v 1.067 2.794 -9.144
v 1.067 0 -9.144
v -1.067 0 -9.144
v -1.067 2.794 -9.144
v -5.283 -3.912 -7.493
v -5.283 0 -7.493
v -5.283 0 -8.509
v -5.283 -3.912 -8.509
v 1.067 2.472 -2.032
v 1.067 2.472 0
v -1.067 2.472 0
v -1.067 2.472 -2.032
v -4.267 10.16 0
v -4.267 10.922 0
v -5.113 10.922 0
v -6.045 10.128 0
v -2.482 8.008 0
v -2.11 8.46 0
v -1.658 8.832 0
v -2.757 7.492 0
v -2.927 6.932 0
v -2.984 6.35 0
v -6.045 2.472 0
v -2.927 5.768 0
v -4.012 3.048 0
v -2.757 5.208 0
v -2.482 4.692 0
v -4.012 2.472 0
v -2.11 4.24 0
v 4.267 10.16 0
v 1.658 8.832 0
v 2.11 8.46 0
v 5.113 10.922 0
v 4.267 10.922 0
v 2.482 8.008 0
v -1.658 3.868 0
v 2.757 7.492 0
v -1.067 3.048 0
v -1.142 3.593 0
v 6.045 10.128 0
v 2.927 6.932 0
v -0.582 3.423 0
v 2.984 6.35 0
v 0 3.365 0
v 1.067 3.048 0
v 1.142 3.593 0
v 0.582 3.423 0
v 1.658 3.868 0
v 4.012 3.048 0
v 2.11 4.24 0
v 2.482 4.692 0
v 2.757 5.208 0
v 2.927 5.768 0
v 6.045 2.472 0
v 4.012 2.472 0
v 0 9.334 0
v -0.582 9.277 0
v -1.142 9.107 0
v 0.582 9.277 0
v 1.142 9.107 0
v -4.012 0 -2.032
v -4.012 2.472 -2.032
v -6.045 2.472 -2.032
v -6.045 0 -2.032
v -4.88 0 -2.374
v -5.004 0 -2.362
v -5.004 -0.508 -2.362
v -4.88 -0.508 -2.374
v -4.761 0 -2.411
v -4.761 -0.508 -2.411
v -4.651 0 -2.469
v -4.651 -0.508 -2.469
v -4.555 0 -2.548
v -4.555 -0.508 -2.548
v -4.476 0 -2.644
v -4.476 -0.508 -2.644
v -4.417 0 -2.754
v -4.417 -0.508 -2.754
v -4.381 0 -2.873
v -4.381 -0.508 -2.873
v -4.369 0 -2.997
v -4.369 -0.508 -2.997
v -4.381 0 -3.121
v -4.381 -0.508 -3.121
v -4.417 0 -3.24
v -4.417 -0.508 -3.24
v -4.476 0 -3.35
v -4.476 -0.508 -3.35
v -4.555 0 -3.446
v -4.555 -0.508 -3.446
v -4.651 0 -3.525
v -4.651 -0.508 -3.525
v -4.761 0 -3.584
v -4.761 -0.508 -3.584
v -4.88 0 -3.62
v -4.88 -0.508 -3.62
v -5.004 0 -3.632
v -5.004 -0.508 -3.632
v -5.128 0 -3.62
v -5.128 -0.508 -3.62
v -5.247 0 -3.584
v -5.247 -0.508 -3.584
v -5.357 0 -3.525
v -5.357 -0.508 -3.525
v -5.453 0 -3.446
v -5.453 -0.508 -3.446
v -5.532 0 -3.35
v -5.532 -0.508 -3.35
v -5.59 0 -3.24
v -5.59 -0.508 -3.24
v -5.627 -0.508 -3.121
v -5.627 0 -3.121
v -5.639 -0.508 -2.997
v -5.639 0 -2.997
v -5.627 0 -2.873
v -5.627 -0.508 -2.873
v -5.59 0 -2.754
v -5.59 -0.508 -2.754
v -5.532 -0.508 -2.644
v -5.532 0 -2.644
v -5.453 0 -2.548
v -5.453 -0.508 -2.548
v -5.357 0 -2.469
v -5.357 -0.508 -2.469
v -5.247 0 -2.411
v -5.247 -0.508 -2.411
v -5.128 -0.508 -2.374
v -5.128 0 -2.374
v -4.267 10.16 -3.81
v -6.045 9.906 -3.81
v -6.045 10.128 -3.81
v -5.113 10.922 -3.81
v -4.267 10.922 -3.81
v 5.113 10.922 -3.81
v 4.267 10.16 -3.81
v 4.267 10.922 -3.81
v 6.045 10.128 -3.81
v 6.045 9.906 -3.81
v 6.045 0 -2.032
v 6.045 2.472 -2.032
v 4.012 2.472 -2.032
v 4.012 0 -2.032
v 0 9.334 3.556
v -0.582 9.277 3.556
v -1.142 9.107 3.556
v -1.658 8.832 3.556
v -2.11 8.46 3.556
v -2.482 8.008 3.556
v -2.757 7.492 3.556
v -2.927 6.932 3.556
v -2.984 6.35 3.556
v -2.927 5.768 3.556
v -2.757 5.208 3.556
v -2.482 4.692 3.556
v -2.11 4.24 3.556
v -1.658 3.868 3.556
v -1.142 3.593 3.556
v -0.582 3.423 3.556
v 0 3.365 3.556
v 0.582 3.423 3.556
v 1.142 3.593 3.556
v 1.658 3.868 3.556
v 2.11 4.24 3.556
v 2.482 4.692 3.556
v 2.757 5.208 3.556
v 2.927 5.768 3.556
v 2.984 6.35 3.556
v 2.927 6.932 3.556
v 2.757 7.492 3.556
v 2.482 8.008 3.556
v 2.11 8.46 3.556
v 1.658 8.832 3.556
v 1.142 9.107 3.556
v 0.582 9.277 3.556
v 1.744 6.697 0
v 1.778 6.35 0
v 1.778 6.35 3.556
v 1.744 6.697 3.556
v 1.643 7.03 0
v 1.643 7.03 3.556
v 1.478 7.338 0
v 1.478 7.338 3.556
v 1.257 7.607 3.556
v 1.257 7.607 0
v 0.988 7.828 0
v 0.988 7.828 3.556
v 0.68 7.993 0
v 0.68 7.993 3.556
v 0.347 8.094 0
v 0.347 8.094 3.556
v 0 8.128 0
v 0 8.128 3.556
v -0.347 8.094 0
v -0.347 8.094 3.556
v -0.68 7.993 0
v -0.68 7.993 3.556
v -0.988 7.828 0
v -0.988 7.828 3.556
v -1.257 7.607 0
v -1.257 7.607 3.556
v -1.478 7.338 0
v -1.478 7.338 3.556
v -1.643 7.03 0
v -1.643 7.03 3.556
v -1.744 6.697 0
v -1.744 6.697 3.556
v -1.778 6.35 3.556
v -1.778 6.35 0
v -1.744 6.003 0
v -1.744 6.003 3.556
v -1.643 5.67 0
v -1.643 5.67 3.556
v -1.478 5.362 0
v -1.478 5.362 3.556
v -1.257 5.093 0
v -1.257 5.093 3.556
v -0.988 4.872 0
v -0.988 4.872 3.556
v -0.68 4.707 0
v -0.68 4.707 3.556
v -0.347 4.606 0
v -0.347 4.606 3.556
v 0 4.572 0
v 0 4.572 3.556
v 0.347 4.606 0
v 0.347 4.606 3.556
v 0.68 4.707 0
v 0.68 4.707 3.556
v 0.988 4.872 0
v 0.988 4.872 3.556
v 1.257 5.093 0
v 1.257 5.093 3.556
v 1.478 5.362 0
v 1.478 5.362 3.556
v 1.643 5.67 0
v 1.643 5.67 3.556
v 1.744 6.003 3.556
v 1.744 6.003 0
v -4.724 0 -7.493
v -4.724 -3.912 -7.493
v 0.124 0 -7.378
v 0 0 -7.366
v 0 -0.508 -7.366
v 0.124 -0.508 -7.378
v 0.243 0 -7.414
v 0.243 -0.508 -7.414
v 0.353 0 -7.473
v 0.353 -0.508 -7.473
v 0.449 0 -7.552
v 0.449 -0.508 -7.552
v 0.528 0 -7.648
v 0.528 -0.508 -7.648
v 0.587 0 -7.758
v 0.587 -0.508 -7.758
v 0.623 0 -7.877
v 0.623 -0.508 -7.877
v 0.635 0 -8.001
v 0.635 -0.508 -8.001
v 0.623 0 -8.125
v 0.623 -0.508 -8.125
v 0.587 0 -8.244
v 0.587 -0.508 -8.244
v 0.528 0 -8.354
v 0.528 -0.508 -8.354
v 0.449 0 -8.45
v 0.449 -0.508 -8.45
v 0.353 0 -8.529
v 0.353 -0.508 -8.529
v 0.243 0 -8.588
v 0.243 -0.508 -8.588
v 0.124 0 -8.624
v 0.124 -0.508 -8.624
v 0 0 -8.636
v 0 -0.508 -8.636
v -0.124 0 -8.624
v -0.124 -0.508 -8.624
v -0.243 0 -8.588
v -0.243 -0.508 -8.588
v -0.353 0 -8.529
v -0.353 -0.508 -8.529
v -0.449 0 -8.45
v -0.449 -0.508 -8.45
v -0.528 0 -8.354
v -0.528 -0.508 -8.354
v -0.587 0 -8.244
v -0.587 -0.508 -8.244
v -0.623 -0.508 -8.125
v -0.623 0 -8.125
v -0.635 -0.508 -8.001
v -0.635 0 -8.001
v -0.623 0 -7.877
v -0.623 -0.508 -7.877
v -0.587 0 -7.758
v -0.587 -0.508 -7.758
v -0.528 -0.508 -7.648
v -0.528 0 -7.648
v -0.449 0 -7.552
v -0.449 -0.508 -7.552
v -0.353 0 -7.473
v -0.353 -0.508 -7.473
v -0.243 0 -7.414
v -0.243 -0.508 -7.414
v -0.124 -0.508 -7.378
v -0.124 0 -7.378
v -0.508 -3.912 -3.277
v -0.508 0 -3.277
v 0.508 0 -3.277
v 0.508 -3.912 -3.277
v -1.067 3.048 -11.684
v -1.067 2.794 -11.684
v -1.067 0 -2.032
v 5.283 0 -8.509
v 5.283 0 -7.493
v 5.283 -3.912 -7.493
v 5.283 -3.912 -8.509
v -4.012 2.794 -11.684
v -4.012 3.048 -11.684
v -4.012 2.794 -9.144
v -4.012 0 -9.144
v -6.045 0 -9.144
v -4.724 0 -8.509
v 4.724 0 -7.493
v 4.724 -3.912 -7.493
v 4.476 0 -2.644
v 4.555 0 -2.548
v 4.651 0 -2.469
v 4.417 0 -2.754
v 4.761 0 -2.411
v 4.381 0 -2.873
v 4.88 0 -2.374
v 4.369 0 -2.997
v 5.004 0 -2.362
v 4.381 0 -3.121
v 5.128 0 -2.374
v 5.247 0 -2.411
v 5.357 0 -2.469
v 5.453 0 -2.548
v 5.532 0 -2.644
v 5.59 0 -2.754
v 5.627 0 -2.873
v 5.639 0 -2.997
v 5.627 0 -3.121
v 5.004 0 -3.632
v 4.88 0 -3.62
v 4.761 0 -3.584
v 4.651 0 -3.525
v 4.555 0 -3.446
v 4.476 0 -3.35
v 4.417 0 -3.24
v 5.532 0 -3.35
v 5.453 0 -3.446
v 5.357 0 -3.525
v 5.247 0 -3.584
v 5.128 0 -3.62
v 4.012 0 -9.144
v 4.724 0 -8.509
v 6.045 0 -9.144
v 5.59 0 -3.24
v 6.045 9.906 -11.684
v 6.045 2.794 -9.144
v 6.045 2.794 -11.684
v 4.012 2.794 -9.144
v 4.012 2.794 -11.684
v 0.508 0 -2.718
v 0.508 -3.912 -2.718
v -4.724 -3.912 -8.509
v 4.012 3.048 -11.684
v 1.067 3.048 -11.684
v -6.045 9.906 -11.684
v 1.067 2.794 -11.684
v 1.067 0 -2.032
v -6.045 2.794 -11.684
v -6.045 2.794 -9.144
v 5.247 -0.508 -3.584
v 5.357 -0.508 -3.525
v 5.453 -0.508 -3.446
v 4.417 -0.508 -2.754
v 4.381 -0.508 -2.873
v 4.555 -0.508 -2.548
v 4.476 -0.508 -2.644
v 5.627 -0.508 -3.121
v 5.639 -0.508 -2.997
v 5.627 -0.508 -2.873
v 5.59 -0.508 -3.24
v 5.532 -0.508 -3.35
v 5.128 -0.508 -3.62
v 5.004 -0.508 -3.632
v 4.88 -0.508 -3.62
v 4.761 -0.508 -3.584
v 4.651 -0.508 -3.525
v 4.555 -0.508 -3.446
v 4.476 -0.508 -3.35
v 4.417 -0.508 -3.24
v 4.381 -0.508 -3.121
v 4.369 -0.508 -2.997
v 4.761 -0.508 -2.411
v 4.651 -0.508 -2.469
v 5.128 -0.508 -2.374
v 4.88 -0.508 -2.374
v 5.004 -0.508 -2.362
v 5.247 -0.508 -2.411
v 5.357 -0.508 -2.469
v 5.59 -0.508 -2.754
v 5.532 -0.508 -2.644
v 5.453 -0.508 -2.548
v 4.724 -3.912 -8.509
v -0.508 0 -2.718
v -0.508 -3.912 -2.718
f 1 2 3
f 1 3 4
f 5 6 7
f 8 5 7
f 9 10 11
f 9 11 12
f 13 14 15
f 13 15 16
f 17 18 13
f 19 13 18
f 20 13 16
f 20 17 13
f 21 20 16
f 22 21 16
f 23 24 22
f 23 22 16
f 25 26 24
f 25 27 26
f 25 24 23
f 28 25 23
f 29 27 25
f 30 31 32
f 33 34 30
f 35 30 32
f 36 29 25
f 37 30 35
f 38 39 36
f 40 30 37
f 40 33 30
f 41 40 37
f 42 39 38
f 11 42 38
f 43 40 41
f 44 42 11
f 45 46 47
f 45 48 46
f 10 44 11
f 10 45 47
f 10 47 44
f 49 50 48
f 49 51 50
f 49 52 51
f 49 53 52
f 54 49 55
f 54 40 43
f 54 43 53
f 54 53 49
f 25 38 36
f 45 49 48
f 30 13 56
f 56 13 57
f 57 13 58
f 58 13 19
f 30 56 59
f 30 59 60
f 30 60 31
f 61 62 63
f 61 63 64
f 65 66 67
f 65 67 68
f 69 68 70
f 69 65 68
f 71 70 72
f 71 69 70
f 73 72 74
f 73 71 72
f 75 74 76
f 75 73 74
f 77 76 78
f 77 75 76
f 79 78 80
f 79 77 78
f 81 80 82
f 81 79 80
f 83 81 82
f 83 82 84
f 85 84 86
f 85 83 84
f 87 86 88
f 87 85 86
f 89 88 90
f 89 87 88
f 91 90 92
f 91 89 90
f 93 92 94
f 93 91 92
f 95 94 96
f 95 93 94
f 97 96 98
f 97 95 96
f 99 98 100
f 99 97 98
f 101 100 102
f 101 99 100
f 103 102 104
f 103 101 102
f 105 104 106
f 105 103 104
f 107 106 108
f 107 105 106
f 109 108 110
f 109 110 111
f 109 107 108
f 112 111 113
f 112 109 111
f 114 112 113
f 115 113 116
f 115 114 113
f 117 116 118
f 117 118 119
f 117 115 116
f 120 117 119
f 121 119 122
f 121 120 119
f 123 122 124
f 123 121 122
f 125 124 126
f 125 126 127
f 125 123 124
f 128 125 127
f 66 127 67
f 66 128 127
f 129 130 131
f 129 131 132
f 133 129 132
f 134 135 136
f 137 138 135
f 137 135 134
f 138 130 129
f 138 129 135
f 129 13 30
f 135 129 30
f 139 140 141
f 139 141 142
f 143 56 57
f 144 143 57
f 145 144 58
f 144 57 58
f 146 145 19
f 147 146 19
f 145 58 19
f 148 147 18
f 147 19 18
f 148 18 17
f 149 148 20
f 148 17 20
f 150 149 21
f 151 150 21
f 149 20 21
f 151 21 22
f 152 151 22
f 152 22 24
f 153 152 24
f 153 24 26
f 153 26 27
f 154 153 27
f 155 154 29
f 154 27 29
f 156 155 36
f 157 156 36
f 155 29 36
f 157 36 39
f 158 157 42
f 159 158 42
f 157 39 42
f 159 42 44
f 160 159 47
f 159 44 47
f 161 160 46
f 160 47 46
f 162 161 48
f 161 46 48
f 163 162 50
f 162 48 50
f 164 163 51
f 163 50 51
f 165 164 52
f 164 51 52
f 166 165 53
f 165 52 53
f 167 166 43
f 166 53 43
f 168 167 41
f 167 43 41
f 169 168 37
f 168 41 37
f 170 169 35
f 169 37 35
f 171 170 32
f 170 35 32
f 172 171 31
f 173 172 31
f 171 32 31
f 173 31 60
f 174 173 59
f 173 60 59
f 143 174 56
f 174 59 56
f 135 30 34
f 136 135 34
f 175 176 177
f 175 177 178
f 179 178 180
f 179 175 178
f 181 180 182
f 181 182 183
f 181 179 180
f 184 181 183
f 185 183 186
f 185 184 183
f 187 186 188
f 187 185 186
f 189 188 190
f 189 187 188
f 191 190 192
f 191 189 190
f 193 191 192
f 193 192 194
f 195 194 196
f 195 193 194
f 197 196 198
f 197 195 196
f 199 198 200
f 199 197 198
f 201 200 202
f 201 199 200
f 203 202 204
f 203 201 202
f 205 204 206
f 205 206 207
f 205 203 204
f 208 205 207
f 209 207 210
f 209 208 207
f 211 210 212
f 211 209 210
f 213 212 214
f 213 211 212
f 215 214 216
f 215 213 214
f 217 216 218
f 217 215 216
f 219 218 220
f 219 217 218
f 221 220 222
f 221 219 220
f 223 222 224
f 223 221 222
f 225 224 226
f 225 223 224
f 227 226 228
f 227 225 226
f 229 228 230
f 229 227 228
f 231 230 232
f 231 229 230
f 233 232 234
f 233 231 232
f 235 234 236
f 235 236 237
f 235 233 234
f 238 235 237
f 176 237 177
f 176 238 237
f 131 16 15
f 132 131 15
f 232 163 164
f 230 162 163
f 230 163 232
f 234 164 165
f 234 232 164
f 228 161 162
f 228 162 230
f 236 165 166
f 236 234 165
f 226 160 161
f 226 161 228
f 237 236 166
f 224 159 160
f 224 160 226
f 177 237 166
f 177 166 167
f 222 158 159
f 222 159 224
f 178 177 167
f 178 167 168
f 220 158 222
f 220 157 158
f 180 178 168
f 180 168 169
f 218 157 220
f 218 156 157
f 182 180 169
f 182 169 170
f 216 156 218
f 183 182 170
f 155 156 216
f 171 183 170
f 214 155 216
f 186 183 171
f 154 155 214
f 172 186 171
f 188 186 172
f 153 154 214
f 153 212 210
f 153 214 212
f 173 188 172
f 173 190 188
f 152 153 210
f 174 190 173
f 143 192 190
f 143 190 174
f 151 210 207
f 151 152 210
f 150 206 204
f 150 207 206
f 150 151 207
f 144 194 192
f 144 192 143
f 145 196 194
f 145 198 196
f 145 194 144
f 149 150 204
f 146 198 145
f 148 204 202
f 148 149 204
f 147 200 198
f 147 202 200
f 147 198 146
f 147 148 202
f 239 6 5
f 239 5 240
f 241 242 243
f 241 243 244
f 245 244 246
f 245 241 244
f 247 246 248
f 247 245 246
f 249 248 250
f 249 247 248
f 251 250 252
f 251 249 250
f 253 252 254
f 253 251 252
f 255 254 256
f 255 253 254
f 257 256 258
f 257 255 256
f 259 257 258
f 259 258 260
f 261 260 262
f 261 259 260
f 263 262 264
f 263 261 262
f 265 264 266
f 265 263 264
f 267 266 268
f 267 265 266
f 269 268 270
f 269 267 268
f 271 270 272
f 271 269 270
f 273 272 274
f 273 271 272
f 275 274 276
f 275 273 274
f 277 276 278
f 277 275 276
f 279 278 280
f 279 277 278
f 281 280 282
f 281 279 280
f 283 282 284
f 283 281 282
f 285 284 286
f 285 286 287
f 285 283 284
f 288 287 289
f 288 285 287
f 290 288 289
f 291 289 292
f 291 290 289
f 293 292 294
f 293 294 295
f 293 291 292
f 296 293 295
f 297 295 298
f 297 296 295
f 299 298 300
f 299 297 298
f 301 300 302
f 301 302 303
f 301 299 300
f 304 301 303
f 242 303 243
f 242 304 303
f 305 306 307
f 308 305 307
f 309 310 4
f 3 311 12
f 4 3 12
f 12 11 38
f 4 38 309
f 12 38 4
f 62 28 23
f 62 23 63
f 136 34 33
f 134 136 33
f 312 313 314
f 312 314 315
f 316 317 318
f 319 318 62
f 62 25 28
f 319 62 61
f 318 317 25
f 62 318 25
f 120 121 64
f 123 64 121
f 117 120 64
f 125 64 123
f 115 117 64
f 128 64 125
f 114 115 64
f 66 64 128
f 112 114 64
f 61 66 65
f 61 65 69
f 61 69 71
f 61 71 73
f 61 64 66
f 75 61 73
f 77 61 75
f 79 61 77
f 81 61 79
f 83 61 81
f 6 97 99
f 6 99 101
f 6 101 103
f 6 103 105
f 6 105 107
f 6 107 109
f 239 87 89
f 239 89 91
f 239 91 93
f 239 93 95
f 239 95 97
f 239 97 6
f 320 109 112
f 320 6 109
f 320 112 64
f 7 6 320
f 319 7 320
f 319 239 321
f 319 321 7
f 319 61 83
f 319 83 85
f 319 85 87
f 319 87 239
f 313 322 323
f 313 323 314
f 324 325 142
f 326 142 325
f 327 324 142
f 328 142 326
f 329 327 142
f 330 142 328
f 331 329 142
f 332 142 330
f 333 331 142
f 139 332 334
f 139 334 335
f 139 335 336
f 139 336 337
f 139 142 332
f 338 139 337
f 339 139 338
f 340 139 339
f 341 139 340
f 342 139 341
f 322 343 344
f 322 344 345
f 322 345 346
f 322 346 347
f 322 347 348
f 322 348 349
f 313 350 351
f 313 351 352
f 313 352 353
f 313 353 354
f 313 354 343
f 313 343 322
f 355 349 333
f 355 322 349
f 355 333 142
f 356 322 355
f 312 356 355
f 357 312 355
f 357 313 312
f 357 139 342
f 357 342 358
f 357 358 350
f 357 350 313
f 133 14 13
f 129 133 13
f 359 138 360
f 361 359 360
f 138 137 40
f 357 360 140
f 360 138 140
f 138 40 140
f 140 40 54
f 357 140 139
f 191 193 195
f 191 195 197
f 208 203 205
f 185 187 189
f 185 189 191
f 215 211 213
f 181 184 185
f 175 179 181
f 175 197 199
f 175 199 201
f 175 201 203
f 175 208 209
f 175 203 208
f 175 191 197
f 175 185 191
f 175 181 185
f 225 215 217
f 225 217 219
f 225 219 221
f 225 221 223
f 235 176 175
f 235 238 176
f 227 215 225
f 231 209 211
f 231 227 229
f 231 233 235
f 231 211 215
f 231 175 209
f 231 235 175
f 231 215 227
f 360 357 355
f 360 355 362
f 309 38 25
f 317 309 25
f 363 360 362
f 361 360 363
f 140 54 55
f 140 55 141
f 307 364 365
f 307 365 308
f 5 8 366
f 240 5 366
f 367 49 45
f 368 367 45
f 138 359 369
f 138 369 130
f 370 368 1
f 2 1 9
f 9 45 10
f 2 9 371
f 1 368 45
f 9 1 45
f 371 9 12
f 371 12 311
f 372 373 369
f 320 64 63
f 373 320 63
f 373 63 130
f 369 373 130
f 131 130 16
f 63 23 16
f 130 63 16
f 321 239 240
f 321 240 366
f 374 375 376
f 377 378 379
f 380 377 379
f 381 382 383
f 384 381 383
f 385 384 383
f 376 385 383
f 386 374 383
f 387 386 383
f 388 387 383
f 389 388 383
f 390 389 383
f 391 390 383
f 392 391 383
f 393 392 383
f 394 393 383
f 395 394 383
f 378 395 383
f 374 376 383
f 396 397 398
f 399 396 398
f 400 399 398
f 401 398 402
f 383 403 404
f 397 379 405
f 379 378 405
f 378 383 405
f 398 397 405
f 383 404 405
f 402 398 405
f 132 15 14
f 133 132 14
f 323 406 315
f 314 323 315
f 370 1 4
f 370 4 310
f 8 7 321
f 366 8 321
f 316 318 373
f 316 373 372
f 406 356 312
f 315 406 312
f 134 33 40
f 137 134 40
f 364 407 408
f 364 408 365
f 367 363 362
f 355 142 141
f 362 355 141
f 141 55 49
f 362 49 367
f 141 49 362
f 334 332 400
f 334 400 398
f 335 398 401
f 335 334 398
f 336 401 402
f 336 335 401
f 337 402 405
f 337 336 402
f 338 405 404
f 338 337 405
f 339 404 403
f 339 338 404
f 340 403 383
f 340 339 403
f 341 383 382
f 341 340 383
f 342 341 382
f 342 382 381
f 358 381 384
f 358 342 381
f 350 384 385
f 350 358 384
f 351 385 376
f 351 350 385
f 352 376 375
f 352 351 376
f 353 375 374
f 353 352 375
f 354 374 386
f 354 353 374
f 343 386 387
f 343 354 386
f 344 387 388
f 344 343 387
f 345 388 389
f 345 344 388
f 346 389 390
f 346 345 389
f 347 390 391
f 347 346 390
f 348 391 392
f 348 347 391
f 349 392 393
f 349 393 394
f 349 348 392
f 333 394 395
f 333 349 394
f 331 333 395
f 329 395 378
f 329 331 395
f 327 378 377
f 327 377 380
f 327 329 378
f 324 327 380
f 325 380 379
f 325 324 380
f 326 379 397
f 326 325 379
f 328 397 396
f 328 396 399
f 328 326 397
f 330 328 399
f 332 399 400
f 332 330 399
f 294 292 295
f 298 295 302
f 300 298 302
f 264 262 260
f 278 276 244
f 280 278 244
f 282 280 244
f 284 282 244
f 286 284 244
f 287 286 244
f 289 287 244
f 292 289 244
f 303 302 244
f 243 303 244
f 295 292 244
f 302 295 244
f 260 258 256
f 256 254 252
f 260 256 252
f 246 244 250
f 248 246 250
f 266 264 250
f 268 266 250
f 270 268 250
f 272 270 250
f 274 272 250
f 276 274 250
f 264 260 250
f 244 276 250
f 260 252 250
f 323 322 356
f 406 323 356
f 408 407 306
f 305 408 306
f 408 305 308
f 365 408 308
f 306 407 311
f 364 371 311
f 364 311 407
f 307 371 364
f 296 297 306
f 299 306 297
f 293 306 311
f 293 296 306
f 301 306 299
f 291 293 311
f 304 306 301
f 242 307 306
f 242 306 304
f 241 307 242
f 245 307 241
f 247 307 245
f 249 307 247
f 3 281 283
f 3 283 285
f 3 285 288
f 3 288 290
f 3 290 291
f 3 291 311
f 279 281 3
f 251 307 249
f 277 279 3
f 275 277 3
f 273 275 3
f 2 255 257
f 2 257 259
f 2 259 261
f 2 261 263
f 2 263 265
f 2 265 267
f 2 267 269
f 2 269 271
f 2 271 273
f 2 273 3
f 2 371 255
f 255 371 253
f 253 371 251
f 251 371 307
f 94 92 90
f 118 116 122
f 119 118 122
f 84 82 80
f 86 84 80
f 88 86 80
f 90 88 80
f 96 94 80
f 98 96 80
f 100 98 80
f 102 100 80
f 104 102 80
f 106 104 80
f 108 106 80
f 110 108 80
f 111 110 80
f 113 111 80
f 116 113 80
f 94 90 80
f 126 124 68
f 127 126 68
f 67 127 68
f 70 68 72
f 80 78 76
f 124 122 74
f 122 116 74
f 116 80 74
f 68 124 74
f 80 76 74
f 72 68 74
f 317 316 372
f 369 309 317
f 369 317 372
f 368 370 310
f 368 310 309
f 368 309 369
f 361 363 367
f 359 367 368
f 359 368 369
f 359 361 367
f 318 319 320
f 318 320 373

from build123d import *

# Parameters (mm, degrees)
EXTRUDE2_DEPTH     = 6.35
SKETCH3_OUTSIDE_W  = 18.79
SKETCH3_OUTSIDE_H  = 17.063
CUT_EXTRUDE1_DEPTH = 18.24066982
SKETCH6_R          = 2.9845
SKETCH6_R_2        = 1.778
EXTRUDE4_DEPTH     = 3.556
SKETCH7_R          = 0.635
EXTRUDE5_DEPTH     = 0.508
SKETCH8_W          = 1.016
SKETCH8_H          = 0.5588
SKETCH8_W_2        = 0.5588
SKETCH8_H_2        = 1.016
EXTRUDE6_DEPTH     = 3.9116


with BuildPart() as part:
    # Sketch2 → Extrude2 (new, symmetric)
    with BuildSketch(Plane(origin=(0, 0, 0), x_dir=(0, 0, -1), z_dir=(1, 0, 0))):
        Polygon((2.032, 0), (9.144, 0), (9.144, 2.794), (11.684, 2.794), (11.684, 9.906), (3.81, 9.906), (3.81, 10.9728), (0, 10.9728), (0, 2.471612931), (2.032, 2.471612931), align=None)
    extrude(amount=EXTRUDE2_DEPTH, both=True)

    # Sketch3 outside → Cut-Extrude1 (cut, through all)
    with BuildSketch(Plane.XY):
        with Locations((0, 5.4865)):
            Rectangle(SKETCH3_OUTSIDE_W, SKETCH3_OUTSIDE_H)
        Polygon((-4.011698259, 0), (-6.0452, 0), (-6.0452, 10.128452415), (-5.112567083, 10.922), (-4.2672, 10.922), (-4.2672, 10.16), (4.2672, 10.16), (4.2672, 10.922), (5.112567083, 10.922), (6.0452, 10.128452415), (6.0452, 0), (4.011698259, 0), (4.011698259, 3.048), (1.0668, 3.048), (1.0668, 0), (-1.0668, 0), (-1.0668, 3.048), (-4.011698259, 3.048), align=None, mode=Mode.SUBTRACT)
    extrude(amount=-CUT_EXTRUDE1_DEPTH, mode=Mode.SUBTRACT)

    # Sketch6 → Extrude4 (add)
    with BuildSketch(Plane.XY):
        with Locations(Location((0, 6.35, 0), (0, 0, 90))):
            Circle(SKETCH6_R)
        with Locations((0, 6.35)):
            Circle(SKETCH6_R_2, mode=Mode.SUBTRACT)
    extrude(amount=EXTRUDE4_DEPTH)

    # Sketch7 → Extrude5 (add)
    with BuildSketch(Plane(origin=(0, 0, 0), x_dir=(1, 0, 0), z_dir=(0, 1, 0))):
        with Locations(Location((0, 8.001, 0), (0, 0, 270))):
            Circle(SKETCH7_R)
        with Locations(Location((5.0038, 2.9972, 0), (0, 0, 270))):
            Circle(SKETCH7_R)
        with Locations(Location((-5.0038, 2.9972, 0), (0, 0, 270))):
            Circle(SKETCH7_R)
    extrude(amount=-EXTRUDE5_DEPTH)

    # Sketch8 → Extrude6 (add)
    with BuildSketch(Plane(origin=(0, 0, 0), x_dir=(1, 0, 0), z_dir=(0, 1, 0))):
        with Locations((0, 2.9972)):
            Rectangle(SKETCH8_W, SKETCH8_H)
        with Locations((-5.0038, 8.001)):
            Rectangle(SKETCH8_W_2, SKETCH8_H_2)
        with Locations((5.0038, 8.001)):
            Rectangle(SKETCH8_W_2, SKETCH8_H_2)
    extrude(amount=-EXTRUDE6_DEPTH)


solid = part.part
